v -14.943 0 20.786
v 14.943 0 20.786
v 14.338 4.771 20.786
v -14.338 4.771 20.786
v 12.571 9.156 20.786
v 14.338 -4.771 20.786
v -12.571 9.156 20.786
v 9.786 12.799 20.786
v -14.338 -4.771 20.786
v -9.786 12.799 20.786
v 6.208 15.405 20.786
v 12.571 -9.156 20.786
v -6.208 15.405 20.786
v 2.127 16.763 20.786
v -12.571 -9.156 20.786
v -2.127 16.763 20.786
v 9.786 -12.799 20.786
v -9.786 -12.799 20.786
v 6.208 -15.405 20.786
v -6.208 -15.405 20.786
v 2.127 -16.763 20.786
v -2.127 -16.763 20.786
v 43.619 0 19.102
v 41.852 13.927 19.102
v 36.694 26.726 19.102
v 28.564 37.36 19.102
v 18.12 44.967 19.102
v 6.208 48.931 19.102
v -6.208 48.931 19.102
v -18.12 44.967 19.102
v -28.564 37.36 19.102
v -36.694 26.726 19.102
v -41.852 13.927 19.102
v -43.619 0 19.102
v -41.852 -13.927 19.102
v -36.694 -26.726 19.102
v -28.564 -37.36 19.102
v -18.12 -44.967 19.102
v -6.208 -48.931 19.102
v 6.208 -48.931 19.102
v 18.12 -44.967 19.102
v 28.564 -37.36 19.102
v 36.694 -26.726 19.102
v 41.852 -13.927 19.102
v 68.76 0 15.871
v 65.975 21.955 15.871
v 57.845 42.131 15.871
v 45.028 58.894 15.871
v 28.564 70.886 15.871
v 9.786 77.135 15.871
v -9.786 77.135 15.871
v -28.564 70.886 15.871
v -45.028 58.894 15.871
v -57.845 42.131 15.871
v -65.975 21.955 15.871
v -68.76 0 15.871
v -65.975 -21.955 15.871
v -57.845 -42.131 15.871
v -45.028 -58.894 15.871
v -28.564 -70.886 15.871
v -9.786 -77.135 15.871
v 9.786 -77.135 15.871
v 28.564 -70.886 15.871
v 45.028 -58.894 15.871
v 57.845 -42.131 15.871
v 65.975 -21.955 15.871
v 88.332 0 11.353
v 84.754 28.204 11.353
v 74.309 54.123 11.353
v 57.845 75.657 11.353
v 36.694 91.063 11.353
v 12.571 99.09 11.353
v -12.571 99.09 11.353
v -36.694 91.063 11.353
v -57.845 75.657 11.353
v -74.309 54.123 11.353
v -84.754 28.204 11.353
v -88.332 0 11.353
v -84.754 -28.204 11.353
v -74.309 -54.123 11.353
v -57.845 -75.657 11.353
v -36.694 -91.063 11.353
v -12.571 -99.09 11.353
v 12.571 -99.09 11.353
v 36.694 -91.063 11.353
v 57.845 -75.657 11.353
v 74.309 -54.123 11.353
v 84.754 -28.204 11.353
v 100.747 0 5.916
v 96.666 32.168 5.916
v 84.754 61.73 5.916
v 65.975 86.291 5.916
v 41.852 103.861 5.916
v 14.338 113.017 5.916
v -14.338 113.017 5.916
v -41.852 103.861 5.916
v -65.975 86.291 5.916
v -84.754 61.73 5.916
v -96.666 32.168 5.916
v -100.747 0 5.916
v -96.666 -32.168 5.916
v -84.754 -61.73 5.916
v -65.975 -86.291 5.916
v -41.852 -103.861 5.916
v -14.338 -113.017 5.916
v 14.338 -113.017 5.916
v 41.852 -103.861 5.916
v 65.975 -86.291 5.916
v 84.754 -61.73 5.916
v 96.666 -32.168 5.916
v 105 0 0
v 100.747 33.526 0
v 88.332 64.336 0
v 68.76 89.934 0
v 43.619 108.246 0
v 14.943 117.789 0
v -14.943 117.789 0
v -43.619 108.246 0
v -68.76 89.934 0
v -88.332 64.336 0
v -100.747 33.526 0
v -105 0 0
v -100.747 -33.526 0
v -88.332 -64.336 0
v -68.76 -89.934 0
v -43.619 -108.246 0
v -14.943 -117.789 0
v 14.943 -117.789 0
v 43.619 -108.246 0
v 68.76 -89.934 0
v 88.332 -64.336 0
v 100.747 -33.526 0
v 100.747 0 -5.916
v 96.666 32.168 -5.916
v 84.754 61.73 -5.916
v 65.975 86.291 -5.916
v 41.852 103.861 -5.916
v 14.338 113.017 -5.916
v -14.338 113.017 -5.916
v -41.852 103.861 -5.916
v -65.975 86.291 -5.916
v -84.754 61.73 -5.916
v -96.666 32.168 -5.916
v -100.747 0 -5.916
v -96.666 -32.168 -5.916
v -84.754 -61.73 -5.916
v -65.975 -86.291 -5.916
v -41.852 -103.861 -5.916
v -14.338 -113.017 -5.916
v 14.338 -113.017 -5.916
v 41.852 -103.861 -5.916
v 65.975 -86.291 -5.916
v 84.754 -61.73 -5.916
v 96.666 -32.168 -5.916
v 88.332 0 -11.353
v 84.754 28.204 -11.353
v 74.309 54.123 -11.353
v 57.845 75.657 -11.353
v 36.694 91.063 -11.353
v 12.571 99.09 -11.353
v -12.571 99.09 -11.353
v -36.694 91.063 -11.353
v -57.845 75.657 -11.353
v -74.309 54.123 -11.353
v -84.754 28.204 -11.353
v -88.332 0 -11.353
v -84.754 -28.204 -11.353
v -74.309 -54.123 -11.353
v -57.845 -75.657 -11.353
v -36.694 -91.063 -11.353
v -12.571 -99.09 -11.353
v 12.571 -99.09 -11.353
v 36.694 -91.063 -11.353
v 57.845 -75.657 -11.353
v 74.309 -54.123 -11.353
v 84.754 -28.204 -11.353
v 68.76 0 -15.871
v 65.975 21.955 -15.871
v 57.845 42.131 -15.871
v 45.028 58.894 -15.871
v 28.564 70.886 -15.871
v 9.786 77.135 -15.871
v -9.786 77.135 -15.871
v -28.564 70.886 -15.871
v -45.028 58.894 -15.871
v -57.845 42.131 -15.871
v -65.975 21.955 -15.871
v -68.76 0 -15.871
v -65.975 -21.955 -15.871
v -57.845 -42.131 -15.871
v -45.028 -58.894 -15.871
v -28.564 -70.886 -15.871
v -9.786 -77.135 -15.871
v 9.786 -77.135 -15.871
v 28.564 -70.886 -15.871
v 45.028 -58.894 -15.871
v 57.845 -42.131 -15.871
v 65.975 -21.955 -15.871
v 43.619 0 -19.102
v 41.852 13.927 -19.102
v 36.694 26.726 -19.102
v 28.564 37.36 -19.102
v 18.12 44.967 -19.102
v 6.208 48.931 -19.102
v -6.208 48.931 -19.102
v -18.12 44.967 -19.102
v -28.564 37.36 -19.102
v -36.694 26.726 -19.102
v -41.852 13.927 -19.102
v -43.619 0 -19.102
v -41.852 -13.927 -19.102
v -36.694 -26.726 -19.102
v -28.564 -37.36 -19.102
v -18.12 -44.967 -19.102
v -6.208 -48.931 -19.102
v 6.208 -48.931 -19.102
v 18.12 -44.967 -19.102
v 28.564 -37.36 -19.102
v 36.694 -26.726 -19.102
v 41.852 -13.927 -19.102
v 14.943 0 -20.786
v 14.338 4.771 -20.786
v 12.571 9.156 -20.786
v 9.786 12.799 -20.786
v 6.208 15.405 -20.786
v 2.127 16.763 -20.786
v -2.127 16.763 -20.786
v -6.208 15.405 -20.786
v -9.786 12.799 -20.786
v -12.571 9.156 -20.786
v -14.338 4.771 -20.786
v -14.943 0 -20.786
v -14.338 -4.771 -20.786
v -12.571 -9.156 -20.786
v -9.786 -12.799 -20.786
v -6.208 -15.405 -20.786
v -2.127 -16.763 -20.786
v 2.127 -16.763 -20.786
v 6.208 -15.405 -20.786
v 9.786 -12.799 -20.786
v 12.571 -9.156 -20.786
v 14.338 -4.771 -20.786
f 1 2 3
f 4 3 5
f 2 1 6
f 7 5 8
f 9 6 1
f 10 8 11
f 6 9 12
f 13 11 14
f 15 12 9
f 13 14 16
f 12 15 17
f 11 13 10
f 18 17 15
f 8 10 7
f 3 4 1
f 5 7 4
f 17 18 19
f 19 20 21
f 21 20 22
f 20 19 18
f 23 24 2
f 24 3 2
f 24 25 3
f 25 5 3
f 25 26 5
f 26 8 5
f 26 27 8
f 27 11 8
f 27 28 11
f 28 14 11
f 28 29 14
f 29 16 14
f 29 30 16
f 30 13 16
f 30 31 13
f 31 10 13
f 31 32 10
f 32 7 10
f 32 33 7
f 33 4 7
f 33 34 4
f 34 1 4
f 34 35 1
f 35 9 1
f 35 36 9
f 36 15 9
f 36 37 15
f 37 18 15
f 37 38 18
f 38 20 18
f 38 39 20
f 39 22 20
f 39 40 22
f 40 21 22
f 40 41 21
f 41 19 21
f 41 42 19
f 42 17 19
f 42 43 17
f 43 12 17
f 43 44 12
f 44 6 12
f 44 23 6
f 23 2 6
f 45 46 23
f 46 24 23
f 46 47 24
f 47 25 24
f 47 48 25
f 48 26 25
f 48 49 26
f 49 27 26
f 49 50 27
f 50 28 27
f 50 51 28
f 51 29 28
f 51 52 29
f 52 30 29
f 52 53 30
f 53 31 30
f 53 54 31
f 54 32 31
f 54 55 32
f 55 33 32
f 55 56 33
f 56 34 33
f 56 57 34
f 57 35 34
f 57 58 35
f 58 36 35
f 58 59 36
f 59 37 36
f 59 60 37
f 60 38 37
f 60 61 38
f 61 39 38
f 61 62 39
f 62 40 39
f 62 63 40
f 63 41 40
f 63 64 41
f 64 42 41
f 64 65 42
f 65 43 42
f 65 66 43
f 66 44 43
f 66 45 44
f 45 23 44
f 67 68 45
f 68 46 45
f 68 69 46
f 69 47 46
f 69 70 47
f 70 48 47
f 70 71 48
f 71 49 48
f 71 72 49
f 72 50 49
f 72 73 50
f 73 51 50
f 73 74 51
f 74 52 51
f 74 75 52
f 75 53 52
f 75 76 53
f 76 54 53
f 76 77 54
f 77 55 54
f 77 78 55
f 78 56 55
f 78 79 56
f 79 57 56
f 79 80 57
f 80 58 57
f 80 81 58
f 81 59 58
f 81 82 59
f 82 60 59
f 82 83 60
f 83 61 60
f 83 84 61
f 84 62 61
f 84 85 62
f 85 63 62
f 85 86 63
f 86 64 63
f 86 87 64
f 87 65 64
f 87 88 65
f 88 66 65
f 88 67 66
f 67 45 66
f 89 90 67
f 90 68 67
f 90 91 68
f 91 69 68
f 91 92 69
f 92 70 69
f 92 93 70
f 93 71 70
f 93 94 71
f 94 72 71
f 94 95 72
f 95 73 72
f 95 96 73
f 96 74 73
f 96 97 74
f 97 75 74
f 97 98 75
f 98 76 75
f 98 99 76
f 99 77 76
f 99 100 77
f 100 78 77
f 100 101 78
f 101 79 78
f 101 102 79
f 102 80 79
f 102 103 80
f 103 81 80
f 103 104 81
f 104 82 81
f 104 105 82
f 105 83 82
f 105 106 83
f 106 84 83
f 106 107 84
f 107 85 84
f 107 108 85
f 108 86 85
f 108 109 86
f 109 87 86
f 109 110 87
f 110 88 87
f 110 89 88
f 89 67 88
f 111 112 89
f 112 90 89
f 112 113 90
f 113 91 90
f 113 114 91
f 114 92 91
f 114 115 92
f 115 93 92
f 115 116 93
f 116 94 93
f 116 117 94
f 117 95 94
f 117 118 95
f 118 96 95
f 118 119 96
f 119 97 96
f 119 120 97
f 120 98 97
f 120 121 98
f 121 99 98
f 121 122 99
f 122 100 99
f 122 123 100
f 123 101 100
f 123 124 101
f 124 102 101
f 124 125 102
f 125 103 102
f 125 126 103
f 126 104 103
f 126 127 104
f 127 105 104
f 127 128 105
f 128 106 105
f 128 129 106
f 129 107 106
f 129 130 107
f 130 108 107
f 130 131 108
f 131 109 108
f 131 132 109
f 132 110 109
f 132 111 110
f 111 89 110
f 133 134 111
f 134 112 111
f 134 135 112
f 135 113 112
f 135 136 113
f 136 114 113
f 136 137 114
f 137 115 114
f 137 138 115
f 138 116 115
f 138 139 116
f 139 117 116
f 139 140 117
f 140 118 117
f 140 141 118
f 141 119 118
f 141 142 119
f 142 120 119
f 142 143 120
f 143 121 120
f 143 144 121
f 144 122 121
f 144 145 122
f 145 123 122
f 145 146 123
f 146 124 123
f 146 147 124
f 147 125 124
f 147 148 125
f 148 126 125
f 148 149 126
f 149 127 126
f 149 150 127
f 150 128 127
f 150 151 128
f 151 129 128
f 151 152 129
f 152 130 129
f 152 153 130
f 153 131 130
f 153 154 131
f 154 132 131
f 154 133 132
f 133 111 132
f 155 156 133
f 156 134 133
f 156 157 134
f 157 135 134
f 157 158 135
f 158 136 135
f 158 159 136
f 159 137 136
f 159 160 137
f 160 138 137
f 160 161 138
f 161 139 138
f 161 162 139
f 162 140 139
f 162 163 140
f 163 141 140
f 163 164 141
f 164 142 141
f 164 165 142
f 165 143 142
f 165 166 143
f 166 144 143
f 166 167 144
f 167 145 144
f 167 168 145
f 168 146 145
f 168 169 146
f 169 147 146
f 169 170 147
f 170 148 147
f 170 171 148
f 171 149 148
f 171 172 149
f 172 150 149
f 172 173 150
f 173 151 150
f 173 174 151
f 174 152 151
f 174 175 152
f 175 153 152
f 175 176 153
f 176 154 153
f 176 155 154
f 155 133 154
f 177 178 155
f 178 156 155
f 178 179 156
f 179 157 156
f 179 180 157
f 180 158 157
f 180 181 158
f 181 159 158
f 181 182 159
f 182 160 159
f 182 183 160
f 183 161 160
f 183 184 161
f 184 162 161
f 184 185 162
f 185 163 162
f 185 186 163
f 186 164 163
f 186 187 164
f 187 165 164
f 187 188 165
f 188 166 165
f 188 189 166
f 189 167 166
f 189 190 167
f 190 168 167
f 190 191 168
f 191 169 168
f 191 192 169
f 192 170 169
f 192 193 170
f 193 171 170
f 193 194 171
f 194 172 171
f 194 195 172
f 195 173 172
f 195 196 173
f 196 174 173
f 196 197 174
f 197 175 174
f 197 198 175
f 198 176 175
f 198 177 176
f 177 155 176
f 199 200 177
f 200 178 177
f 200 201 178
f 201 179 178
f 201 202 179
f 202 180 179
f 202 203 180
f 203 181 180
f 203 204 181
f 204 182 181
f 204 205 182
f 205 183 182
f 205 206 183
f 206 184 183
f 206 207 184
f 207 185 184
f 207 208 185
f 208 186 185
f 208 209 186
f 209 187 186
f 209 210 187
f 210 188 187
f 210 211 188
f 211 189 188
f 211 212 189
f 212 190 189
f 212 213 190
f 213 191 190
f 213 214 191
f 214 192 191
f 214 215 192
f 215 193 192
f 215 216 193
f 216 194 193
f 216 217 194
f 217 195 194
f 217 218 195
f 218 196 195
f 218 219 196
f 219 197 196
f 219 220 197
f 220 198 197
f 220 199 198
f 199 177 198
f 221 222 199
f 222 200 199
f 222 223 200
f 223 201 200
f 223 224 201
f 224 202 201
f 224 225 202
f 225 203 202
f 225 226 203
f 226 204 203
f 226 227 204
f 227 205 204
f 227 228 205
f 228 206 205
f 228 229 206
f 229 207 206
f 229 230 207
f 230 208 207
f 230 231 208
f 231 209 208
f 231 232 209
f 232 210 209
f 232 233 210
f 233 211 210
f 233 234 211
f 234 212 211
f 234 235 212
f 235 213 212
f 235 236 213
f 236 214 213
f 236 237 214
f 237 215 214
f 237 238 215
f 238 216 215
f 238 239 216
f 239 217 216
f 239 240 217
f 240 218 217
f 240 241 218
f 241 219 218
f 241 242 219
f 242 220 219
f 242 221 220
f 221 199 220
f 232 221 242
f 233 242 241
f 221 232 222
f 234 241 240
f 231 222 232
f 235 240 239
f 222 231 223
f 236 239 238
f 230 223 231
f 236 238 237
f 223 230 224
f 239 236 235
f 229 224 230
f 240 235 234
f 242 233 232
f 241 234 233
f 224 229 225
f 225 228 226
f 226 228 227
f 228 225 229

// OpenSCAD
// Generated by SolidPython 1.0.1 on 2020-07-29 00:46:52


scale(v = [15, 17, 3]) {
	sphere(r = 7);
}
/***********************************************
*********      SolidPython code:      **********
************************************************
 
# import packages: SolidPython
from solid import *
from solid.utils import *
from itertools import chain, combinations, permutations


class Resize:

    def __init__(self, scad_file):
        self.scad_file = scad_file
        #self.scad_file = import_scad(scad_file)
        # cone/cylinder param:
        self.r1 = 0
        self.r2 = 0
        self.h = 0
        # rectangular prism param:
        self.w = 0
        self.l = 0
        # ellipse param:
        self.r = 0

    # import OpenScad code (file name corresponds to shape)


    # classify shape + parameters
    def assign(self, param1, param2, param3):
        if self.scad_file == 'cone.scad':
            self.r1 = param1
            self.r2 = param2
            self.h = param3
        elif self.scad_file == 'cylinder.scad':
            self.r1 = param1
            self.r2 = param2
            self.h = param3
        elif self.scad_file == 'rectangularPrism.scad':
            self.h = param1
            self.l = param2
            self.w = param3
        else:
            self.r = param1
            self.h = param2

    # resize parameters
    def iterate(self):
        x = range(3, 20, 2)
        i = 1
        if self.scad_file == 'cone.scad':
            tempList = list(permutations(x, 2))
            for temp in tempList:
                param1 = temp[0]
                param2 = temp[1]
                filepath = 'produced_scad_files/' + 'cone' + str(param1) + '_' + str(param2) + '_' + '.scad'
                scad_render_to_file(cylinder(h=param1, r1=param2, r2=0), filepath)

        elif self.scad_file == 'cylinder.scad':
            tempList = list(permutations(x, 3))
            for temp in tempList:
                param1 = temp[0]
                param2 = temp[1]
                filepath = 'produced_scad_files/' + 'cylinder' + str(param1) + '_' + str(param2) + '_' + '.scad'
                scad_render_to_file(cylinder(h=param1, r1=param2, r2=param2), filepath)

        elif self.scad_file == 'rectangularPrism.scad':
            tempList = list(permutations(x, 3))
            for temp in tempList:
                param1 = temp[0]
                param2 = temp[1]
                param3 = temp[2]
                filepath = 'produced_scad_files/' + 'rectangularPrism' + str(param1) + '_' + str(param2) + '_' + str(
                    param3) + '.scad'
                scad_render_to_file(cube(size=(param1, param2, param3)), filepath)

        elif self.scad_file == 'ellipse.scad':
            tempList = list(permutations(x, 4))
            for temp in tempList:
                param1 = temp[0]
                param2 = temp[1]
                param3 = temp[2]
                param4 = temp[3]
                filepath = 'produced_scad_files/' + 'ellipse' + str(param1) + '_' + str(param2) + '_' + str(param3) + '_' + str(param4) + '.scad'
                scad_render_to_file(scale([param1, param2, param3])(sphere(r=param4)), filepath)

    def render_to_scadfile(self):
        scad_render_to_file(scad, 'example.scad') 
 
************************************************/
